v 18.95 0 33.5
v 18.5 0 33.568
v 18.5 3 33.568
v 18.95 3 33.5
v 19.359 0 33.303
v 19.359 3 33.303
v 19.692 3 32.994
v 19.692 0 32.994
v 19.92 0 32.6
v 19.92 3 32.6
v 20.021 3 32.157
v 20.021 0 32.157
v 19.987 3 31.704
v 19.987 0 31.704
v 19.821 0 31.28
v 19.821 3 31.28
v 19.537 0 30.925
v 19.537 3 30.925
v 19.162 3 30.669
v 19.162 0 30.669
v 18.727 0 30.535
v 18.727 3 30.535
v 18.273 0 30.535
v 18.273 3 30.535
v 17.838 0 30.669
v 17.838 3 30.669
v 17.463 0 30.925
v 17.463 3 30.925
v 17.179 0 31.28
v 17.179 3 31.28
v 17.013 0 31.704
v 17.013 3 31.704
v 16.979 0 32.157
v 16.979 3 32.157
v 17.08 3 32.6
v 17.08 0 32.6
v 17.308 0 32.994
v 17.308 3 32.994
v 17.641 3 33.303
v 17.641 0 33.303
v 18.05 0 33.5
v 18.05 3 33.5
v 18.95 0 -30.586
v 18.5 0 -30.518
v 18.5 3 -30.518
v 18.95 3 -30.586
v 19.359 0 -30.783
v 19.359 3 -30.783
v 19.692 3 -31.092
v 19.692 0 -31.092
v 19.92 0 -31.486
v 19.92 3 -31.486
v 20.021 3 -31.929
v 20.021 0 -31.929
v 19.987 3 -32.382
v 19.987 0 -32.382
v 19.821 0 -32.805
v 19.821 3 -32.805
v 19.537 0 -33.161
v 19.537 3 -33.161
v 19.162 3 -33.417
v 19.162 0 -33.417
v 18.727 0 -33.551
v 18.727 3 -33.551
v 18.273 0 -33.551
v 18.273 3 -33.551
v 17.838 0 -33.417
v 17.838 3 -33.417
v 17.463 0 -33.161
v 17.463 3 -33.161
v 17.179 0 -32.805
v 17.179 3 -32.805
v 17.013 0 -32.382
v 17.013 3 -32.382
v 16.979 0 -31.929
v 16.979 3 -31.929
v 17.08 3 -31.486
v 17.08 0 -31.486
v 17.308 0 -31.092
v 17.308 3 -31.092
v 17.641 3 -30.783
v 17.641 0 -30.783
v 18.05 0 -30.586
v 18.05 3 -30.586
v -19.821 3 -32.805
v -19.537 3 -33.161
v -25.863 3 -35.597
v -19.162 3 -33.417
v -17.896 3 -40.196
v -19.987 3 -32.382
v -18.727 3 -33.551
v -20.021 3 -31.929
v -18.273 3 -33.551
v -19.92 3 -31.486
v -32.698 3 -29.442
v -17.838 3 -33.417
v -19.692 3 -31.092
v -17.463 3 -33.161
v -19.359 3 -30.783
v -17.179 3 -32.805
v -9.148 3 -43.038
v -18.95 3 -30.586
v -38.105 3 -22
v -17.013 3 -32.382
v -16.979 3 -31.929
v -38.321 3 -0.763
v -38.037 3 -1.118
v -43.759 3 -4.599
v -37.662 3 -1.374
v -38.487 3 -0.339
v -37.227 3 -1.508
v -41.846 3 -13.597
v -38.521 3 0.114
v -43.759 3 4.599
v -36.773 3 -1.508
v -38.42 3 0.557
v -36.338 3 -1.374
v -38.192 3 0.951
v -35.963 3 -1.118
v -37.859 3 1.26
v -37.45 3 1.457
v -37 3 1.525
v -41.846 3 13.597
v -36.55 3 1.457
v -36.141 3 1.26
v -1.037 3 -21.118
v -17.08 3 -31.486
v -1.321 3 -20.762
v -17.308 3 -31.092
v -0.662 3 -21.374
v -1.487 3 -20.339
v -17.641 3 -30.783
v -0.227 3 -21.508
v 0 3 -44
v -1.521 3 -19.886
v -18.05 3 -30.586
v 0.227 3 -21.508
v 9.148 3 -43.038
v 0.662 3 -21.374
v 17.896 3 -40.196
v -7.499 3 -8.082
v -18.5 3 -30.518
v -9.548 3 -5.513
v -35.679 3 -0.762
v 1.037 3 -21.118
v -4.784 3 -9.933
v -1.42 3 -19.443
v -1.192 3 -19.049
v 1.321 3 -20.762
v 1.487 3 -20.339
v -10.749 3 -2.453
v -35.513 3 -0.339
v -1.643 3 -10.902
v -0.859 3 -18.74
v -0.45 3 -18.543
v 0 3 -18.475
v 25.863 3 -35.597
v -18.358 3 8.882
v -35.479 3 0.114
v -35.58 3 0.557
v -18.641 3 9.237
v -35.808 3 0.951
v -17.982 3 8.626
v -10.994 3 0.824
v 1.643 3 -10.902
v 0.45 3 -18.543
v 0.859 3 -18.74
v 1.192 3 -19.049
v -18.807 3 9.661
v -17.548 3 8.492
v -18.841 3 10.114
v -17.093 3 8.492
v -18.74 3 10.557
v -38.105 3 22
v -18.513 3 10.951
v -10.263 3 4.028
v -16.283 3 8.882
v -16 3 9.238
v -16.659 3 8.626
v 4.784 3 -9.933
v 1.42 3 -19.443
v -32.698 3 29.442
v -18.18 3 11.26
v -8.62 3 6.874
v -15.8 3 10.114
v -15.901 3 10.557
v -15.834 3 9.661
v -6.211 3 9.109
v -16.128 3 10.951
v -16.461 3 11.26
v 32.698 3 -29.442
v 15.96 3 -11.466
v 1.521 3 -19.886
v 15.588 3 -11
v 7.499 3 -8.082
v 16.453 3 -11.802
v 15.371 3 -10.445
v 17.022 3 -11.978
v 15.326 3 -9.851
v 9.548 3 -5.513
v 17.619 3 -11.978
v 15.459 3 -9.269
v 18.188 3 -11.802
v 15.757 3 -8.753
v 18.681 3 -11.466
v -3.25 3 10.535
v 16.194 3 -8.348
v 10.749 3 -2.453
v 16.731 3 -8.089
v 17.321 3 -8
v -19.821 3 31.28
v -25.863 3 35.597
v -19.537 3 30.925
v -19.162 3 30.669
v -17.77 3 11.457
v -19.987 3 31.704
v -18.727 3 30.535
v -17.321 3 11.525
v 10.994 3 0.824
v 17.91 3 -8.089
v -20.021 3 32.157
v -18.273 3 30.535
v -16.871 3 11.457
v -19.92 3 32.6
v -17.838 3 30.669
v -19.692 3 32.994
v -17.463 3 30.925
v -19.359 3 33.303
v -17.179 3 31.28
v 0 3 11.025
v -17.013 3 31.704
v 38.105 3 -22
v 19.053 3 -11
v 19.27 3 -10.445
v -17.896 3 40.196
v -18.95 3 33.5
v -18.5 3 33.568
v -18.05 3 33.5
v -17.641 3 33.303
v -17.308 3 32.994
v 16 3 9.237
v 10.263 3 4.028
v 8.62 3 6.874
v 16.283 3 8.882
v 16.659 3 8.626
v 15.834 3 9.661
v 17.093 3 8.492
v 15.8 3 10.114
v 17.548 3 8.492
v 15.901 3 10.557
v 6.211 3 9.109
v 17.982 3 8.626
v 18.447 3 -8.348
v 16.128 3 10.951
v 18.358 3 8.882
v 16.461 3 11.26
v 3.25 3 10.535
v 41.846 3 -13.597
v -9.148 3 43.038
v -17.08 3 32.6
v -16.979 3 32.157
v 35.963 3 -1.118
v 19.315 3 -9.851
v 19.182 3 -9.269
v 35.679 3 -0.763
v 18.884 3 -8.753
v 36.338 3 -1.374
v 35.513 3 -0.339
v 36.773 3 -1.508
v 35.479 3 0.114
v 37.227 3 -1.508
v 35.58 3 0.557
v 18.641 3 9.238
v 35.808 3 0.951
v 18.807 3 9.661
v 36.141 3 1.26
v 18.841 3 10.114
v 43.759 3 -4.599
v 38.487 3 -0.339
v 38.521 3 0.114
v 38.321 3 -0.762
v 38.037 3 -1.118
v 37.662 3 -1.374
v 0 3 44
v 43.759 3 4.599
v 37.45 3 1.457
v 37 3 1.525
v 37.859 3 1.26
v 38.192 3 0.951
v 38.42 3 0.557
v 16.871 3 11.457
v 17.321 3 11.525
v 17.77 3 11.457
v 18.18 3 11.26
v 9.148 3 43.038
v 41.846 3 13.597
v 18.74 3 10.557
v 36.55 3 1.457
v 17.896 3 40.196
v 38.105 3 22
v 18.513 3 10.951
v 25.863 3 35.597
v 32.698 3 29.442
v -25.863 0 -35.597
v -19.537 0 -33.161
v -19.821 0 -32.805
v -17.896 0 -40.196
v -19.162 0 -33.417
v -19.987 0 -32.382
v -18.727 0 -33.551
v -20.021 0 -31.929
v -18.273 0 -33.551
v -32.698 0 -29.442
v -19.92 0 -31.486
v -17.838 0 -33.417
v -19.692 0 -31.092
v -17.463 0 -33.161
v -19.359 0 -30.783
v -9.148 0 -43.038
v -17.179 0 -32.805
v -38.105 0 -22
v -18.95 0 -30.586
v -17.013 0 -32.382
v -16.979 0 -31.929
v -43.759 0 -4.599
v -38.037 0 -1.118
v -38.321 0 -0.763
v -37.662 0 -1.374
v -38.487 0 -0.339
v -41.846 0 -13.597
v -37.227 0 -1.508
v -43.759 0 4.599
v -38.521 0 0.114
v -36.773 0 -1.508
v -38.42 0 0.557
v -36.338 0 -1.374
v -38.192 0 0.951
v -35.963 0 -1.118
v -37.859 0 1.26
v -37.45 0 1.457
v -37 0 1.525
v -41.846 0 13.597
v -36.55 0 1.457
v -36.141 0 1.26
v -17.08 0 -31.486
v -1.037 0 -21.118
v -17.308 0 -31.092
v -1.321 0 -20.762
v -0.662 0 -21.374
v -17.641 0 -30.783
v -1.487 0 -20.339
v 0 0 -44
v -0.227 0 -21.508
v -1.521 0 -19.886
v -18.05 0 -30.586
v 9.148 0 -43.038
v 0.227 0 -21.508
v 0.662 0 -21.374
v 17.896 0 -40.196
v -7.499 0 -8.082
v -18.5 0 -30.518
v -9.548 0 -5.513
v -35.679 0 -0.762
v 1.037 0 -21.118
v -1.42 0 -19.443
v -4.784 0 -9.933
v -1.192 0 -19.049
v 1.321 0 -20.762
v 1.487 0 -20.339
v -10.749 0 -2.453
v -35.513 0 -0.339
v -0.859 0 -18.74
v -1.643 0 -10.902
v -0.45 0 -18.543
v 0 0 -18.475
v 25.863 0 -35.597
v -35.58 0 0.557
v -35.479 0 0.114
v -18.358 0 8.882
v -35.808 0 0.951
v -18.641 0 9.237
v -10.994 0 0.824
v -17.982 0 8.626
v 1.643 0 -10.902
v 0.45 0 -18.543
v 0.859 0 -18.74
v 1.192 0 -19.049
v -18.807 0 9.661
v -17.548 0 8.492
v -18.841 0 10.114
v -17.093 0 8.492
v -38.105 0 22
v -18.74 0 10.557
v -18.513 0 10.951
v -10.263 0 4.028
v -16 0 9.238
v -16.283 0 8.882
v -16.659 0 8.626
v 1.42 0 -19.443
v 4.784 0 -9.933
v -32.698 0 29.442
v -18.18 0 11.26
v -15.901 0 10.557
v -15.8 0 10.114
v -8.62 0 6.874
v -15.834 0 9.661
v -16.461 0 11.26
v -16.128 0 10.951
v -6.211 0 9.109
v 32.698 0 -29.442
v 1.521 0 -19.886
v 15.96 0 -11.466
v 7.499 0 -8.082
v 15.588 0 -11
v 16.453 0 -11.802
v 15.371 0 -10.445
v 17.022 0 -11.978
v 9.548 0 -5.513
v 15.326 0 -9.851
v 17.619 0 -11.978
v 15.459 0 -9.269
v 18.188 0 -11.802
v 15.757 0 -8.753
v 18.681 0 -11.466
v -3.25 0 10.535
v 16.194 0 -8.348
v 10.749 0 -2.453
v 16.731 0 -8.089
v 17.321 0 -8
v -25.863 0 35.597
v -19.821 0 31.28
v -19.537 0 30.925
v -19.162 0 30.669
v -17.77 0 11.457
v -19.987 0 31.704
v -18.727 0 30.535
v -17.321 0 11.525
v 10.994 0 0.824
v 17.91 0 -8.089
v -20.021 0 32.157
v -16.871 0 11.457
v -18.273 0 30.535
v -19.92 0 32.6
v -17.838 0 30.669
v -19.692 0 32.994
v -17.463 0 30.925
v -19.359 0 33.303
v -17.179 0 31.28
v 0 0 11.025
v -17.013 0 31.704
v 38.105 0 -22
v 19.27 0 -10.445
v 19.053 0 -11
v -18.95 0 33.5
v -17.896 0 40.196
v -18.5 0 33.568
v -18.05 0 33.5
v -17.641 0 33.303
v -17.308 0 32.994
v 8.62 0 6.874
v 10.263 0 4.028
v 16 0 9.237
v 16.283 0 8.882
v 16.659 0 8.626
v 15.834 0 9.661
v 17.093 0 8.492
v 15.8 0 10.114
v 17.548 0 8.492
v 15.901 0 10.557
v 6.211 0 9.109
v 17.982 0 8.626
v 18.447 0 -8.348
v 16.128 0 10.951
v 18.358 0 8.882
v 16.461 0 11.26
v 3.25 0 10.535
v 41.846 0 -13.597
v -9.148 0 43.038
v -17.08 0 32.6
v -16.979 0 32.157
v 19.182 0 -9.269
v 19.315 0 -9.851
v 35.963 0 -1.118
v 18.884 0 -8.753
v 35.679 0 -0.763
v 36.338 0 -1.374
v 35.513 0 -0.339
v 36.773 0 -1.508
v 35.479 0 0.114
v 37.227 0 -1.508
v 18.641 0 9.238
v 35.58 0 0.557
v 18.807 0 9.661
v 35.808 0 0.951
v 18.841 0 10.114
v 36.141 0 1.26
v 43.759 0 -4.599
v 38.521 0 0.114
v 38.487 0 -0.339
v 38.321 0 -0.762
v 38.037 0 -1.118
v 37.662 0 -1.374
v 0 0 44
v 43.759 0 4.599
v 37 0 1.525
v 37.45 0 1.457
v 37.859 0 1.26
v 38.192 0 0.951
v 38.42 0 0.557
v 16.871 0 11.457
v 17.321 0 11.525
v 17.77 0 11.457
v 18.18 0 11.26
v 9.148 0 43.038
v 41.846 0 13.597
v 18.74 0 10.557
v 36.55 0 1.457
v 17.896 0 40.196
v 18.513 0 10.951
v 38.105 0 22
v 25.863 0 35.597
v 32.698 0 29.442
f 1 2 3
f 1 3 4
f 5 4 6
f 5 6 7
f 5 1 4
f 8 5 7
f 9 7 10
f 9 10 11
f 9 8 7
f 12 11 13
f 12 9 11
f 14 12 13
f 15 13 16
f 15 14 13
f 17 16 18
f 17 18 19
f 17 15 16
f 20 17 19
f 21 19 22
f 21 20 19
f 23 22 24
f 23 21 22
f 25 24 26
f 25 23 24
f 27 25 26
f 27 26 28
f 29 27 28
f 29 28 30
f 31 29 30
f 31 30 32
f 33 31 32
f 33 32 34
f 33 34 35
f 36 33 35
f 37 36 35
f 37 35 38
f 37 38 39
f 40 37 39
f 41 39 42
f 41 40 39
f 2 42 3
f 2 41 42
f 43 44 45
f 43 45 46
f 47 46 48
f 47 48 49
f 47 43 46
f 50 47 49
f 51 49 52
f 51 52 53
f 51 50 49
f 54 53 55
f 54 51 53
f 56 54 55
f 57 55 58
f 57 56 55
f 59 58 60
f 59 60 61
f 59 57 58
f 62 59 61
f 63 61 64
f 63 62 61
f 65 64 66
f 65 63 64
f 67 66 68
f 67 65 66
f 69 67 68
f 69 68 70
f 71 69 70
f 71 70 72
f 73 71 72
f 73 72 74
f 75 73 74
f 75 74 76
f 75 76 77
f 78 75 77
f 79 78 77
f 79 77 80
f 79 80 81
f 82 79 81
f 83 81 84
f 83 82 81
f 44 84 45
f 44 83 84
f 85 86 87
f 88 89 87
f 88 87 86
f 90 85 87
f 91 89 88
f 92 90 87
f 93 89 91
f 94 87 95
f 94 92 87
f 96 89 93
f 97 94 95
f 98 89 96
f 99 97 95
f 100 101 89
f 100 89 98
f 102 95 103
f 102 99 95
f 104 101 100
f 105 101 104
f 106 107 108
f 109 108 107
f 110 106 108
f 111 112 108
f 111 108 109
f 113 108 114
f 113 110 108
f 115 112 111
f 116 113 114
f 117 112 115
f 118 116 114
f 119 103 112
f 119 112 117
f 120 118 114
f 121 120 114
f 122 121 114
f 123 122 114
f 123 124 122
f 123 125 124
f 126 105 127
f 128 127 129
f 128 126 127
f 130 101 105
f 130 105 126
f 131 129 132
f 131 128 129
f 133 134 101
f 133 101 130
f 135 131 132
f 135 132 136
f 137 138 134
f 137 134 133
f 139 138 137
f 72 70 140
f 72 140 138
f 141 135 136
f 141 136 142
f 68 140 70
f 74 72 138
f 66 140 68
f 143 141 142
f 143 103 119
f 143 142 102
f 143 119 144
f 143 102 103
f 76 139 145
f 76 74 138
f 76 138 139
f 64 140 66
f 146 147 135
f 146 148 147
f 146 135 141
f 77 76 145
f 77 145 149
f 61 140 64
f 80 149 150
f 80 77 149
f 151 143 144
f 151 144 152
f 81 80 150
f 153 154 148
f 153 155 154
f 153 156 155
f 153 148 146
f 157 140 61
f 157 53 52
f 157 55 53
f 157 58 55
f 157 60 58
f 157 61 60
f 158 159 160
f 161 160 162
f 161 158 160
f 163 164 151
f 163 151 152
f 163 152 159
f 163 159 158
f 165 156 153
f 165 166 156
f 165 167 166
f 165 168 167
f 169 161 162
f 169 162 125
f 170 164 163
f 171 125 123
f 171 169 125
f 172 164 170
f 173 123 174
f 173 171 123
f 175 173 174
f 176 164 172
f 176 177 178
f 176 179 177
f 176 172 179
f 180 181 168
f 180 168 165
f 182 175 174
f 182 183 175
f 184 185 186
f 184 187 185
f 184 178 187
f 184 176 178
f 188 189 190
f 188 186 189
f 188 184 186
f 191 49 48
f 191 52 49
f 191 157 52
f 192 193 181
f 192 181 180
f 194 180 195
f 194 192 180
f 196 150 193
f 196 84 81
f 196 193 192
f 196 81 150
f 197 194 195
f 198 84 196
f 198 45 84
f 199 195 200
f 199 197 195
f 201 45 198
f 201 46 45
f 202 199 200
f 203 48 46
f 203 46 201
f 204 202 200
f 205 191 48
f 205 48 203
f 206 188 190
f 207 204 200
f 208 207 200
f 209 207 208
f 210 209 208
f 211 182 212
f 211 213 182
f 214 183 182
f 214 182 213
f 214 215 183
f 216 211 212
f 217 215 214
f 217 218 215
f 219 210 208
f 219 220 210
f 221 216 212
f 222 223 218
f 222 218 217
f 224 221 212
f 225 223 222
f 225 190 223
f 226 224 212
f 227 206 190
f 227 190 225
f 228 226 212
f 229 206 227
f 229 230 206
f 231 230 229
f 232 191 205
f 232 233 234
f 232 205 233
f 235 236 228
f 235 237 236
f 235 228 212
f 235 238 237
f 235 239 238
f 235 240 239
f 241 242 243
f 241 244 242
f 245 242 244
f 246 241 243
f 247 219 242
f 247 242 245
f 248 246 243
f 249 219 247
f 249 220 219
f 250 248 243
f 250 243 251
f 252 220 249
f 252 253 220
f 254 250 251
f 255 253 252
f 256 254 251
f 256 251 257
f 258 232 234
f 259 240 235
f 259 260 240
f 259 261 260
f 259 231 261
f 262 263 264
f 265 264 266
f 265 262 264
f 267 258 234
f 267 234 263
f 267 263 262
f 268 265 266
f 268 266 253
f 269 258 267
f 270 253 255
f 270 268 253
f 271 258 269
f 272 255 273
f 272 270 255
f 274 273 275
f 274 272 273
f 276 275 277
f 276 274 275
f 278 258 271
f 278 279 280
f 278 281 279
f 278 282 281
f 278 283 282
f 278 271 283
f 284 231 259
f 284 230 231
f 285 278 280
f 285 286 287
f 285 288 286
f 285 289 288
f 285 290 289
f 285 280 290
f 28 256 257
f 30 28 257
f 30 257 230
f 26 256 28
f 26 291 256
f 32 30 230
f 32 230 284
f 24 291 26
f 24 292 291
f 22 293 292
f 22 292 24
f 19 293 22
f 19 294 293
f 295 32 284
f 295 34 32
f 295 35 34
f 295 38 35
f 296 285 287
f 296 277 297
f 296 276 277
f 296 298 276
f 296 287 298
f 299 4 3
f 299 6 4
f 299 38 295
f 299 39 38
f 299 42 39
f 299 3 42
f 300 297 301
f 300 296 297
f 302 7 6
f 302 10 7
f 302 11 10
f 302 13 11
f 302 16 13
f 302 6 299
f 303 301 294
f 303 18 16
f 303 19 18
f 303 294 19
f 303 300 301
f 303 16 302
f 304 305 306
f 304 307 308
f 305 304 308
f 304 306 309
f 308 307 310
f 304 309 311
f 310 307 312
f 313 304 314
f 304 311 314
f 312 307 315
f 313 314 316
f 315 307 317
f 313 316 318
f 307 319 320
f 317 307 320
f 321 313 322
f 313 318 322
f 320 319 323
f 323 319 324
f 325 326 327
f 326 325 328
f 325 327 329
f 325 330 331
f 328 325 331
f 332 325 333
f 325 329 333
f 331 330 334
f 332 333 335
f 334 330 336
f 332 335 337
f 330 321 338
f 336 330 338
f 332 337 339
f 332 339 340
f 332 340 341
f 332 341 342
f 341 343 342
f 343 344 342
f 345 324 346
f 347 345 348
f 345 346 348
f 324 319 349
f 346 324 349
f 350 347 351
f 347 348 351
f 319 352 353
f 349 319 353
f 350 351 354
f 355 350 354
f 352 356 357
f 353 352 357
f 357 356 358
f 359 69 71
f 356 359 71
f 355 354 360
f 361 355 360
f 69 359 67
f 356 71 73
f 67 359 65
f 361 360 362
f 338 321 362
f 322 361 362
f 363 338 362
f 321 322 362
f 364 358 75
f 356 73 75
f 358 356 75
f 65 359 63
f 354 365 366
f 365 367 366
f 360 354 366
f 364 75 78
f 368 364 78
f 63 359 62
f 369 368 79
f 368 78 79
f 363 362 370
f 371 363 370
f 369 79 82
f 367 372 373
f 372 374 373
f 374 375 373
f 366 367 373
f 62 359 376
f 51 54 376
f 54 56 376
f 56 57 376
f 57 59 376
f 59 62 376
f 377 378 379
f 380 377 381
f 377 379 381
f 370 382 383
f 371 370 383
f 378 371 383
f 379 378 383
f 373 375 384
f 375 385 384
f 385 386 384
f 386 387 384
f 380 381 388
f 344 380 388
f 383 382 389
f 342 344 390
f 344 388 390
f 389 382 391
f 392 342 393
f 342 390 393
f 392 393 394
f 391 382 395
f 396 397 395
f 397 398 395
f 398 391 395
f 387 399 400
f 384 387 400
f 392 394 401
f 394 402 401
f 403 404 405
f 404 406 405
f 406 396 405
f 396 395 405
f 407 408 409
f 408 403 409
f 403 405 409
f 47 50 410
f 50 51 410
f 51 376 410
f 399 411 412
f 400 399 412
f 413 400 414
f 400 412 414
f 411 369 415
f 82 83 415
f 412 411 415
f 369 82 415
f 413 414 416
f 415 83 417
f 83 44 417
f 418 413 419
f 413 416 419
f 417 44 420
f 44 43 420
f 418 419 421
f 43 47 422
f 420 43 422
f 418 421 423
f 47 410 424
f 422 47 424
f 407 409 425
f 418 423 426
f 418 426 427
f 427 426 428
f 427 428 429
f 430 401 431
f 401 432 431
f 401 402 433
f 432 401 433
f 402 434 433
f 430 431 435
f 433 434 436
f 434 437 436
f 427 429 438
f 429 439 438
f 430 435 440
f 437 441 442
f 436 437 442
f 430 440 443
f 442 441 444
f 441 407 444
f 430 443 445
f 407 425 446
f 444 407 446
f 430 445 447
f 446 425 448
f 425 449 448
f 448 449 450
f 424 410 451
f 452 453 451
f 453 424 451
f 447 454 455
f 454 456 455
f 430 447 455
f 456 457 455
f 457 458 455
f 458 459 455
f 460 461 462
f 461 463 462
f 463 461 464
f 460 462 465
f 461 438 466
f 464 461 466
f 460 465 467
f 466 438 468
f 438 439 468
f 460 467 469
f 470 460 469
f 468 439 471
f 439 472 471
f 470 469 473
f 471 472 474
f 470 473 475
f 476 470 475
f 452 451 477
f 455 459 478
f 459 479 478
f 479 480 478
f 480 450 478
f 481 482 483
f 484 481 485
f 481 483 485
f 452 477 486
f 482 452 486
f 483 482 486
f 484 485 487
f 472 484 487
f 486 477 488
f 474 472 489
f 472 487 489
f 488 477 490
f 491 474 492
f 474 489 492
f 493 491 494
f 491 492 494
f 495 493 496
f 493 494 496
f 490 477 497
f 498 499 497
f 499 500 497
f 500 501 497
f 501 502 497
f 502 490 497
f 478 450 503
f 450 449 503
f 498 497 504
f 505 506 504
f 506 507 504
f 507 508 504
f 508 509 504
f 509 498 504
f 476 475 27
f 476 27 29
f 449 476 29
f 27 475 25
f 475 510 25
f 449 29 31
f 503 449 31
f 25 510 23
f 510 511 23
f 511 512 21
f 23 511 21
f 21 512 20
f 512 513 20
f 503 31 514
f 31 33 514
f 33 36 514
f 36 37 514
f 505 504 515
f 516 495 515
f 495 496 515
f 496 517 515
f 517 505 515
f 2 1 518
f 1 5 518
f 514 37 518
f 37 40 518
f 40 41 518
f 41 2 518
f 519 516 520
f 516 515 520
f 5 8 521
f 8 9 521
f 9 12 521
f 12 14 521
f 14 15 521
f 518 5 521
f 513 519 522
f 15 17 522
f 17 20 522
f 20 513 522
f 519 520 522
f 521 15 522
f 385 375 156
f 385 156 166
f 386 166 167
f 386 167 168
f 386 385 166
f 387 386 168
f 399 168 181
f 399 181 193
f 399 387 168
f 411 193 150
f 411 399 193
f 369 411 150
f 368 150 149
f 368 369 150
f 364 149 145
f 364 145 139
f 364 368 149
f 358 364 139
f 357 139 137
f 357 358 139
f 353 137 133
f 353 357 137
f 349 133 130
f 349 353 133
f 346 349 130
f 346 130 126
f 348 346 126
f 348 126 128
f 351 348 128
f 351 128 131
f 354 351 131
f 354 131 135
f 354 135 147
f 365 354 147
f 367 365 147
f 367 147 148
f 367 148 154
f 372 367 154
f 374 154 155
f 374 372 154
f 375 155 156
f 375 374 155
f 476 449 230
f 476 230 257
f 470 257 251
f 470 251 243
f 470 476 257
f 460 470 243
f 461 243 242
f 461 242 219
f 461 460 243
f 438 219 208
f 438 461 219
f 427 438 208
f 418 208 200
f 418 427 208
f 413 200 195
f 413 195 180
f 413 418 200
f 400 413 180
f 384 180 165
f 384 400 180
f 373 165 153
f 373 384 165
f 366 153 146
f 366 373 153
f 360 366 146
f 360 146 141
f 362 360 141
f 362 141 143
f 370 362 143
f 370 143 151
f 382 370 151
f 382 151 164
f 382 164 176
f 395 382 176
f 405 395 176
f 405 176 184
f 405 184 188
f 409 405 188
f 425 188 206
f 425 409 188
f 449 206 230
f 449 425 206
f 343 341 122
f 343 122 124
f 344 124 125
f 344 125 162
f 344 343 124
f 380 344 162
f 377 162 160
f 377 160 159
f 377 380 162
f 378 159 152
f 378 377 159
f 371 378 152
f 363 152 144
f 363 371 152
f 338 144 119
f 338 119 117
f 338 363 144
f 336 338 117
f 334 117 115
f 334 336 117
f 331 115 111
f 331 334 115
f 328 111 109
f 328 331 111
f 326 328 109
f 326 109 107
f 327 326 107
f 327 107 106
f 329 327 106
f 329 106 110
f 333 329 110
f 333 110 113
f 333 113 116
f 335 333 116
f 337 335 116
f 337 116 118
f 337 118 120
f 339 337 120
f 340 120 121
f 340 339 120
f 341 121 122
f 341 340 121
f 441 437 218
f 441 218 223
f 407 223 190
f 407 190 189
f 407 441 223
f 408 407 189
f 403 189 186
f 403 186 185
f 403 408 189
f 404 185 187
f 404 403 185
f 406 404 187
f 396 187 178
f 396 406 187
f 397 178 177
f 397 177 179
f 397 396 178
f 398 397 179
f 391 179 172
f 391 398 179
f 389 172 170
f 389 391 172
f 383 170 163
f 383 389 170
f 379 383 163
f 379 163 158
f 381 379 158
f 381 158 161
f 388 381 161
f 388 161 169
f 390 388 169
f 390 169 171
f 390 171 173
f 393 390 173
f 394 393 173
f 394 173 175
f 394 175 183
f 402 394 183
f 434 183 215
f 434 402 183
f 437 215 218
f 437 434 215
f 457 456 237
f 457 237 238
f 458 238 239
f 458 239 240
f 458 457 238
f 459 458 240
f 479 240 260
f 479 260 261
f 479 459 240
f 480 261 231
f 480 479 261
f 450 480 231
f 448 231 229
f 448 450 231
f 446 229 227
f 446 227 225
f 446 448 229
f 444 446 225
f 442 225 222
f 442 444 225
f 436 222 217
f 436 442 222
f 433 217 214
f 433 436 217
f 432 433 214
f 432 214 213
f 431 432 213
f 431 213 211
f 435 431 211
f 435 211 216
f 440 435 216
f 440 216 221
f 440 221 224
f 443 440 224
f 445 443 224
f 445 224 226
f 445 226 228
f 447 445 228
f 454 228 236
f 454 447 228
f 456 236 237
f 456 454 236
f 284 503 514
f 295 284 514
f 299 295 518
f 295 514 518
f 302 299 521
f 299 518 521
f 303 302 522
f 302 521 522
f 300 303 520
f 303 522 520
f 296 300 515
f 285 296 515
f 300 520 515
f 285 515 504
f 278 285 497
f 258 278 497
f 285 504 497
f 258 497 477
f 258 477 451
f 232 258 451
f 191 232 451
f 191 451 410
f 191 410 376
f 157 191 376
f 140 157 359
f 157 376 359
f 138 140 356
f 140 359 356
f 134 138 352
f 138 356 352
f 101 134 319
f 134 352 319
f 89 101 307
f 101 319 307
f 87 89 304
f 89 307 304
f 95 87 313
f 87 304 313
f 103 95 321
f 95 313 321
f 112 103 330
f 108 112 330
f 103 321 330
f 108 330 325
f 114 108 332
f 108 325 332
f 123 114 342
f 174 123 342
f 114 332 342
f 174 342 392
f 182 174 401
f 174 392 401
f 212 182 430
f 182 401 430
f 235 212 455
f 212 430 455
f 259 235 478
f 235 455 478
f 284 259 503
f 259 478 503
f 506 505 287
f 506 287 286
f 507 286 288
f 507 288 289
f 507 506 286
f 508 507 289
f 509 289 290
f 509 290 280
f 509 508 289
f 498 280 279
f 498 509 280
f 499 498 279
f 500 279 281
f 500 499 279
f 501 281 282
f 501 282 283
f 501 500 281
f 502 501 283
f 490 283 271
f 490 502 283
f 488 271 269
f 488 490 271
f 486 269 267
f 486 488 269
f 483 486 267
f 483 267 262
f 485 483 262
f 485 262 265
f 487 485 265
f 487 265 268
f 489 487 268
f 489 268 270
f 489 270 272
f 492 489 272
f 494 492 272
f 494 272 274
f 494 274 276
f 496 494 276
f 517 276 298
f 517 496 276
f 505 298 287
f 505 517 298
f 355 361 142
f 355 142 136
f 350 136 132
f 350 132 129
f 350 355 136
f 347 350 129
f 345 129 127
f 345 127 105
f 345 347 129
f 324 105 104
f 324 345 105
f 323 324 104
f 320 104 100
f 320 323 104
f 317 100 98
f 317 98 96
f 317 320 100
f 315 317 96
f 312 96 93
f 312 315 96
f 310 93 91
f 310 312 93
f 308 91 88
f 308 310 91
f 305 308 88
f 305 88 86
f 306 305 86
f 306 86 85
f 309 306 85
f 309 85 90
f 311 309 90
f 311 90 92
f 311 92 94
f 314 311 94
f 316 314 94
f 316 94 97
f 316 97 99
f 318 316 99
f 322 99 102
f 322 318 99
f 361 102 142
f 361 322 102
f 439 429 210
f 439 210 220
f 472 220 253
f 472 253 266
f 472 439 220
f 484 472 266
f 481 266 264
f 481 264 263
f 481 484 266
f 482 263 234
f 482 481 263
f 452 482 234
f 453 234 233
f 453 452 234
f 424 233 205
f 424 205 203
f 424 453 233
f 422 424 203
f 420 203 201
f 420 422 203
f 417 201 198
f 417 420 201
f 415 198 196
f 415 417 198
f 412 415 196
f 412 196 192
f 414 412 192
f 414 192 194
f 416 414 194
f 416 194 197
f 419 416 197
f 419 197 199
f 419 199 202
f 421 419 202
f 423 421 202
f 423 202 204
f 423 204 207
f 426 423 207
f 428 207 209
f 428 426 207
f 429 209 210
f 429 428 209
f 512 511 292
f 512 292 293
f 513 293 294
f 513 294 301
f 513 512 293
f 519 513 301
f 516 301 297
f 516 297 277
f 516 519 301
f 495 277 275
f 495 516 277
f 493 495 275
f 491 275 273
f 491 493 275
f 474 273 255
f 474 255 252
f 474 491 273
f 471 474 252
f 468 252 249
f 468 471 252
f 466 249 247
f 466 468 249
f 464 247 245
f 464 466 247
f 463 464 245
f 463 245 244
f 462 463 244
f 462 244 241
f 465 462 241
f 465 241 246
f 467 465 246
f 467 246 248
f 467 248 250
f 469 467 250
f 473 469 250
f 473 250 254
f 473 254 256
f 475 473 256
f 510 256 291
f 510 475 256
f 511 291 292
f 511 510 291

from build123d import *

# Parameters (mm, degrees)
SKETCH_1_R      = 44
SKETCH_1_R_2    = 1.525
SKETCH_1_R_3    = 11.025
SKETCH_1_R_4    = 2
EXTRUDE_1_DEPTH = 3


with BuildPart() as part:
    # 草图1 → 凸台-拉伸1 (new body)
    with BuildSketch(Plane(origin=(0, 0, 0), x_dir=(1, 0, 0), z_dir=(0, 1, 0))):
        with Locations(Location((0, 0, 0), (0, 0, 270))):
            Circle(SKETCH_1_R)
        with Locations(Location((37, 0, 0), (0, 0, 270))):
            Circle(SKETCH_1_R_2, mode=Mode.SUBTRACT)
        with Locations(Location((18.5, -32.04293994, 0), (0, 0, 270))):
            Circle(SKETCH_1_R_2, mode=Mode.SUBTRACT)
        with Locations(Location((-18.5, -32.04293994, 0), (0, 0, 270))):
            Circle(SKETCH_1_R_2, mode=Mode.SUBTRACT)
        with Locations(Location((-37, 0, 0), (0, 0, 270))):
            Circle(SKETCH_1_R_2, mode=Mode.SUBTRACT)
        with Locations(Location((-18.5, 32.04293994, 0), (0, 0, 270))):
            Circle(SKETCH_1_R_2, mode=Mode.SUBTRACT)
        with Locations(Location((18.5, 32.04293994, 0), (0, 0, 270))):
            Circle(SKETCH_1_R_2, mode=Mode.SUBTRACT)
        with Locations(Location((0, 0, 0), (0, 0, 270))):
            Circle(SKETCH_1_R_3, mode=Mode.SUBTRACT)
        with Locations(Location((0, 20, 0), (0, 0, 270))):
            Circle(SKETCH_1_R_2, mode=Mode.SUBTRACT)
        with Locations(Location((17.320508076, -10, 0), (0, 0, 270))):
            Circle(SKETCH_1_R_2, mode=Mode.SUBTRACT)
        with Locations(Location((-17.320508076, -10, 0), (0, 0, 270))):
            Circle(SKETCH_1_R_2, mode=Mode.SUBTRACT)
        with Locations(Location((17.320508076, 10, 0), (0, 0, 270))):
            Circle(SKETCH_1_R_4, mode=Mode.SUBTRACT)
    extrude(amount=EXTRUDE_1_DEPTH)


solid = part.part
